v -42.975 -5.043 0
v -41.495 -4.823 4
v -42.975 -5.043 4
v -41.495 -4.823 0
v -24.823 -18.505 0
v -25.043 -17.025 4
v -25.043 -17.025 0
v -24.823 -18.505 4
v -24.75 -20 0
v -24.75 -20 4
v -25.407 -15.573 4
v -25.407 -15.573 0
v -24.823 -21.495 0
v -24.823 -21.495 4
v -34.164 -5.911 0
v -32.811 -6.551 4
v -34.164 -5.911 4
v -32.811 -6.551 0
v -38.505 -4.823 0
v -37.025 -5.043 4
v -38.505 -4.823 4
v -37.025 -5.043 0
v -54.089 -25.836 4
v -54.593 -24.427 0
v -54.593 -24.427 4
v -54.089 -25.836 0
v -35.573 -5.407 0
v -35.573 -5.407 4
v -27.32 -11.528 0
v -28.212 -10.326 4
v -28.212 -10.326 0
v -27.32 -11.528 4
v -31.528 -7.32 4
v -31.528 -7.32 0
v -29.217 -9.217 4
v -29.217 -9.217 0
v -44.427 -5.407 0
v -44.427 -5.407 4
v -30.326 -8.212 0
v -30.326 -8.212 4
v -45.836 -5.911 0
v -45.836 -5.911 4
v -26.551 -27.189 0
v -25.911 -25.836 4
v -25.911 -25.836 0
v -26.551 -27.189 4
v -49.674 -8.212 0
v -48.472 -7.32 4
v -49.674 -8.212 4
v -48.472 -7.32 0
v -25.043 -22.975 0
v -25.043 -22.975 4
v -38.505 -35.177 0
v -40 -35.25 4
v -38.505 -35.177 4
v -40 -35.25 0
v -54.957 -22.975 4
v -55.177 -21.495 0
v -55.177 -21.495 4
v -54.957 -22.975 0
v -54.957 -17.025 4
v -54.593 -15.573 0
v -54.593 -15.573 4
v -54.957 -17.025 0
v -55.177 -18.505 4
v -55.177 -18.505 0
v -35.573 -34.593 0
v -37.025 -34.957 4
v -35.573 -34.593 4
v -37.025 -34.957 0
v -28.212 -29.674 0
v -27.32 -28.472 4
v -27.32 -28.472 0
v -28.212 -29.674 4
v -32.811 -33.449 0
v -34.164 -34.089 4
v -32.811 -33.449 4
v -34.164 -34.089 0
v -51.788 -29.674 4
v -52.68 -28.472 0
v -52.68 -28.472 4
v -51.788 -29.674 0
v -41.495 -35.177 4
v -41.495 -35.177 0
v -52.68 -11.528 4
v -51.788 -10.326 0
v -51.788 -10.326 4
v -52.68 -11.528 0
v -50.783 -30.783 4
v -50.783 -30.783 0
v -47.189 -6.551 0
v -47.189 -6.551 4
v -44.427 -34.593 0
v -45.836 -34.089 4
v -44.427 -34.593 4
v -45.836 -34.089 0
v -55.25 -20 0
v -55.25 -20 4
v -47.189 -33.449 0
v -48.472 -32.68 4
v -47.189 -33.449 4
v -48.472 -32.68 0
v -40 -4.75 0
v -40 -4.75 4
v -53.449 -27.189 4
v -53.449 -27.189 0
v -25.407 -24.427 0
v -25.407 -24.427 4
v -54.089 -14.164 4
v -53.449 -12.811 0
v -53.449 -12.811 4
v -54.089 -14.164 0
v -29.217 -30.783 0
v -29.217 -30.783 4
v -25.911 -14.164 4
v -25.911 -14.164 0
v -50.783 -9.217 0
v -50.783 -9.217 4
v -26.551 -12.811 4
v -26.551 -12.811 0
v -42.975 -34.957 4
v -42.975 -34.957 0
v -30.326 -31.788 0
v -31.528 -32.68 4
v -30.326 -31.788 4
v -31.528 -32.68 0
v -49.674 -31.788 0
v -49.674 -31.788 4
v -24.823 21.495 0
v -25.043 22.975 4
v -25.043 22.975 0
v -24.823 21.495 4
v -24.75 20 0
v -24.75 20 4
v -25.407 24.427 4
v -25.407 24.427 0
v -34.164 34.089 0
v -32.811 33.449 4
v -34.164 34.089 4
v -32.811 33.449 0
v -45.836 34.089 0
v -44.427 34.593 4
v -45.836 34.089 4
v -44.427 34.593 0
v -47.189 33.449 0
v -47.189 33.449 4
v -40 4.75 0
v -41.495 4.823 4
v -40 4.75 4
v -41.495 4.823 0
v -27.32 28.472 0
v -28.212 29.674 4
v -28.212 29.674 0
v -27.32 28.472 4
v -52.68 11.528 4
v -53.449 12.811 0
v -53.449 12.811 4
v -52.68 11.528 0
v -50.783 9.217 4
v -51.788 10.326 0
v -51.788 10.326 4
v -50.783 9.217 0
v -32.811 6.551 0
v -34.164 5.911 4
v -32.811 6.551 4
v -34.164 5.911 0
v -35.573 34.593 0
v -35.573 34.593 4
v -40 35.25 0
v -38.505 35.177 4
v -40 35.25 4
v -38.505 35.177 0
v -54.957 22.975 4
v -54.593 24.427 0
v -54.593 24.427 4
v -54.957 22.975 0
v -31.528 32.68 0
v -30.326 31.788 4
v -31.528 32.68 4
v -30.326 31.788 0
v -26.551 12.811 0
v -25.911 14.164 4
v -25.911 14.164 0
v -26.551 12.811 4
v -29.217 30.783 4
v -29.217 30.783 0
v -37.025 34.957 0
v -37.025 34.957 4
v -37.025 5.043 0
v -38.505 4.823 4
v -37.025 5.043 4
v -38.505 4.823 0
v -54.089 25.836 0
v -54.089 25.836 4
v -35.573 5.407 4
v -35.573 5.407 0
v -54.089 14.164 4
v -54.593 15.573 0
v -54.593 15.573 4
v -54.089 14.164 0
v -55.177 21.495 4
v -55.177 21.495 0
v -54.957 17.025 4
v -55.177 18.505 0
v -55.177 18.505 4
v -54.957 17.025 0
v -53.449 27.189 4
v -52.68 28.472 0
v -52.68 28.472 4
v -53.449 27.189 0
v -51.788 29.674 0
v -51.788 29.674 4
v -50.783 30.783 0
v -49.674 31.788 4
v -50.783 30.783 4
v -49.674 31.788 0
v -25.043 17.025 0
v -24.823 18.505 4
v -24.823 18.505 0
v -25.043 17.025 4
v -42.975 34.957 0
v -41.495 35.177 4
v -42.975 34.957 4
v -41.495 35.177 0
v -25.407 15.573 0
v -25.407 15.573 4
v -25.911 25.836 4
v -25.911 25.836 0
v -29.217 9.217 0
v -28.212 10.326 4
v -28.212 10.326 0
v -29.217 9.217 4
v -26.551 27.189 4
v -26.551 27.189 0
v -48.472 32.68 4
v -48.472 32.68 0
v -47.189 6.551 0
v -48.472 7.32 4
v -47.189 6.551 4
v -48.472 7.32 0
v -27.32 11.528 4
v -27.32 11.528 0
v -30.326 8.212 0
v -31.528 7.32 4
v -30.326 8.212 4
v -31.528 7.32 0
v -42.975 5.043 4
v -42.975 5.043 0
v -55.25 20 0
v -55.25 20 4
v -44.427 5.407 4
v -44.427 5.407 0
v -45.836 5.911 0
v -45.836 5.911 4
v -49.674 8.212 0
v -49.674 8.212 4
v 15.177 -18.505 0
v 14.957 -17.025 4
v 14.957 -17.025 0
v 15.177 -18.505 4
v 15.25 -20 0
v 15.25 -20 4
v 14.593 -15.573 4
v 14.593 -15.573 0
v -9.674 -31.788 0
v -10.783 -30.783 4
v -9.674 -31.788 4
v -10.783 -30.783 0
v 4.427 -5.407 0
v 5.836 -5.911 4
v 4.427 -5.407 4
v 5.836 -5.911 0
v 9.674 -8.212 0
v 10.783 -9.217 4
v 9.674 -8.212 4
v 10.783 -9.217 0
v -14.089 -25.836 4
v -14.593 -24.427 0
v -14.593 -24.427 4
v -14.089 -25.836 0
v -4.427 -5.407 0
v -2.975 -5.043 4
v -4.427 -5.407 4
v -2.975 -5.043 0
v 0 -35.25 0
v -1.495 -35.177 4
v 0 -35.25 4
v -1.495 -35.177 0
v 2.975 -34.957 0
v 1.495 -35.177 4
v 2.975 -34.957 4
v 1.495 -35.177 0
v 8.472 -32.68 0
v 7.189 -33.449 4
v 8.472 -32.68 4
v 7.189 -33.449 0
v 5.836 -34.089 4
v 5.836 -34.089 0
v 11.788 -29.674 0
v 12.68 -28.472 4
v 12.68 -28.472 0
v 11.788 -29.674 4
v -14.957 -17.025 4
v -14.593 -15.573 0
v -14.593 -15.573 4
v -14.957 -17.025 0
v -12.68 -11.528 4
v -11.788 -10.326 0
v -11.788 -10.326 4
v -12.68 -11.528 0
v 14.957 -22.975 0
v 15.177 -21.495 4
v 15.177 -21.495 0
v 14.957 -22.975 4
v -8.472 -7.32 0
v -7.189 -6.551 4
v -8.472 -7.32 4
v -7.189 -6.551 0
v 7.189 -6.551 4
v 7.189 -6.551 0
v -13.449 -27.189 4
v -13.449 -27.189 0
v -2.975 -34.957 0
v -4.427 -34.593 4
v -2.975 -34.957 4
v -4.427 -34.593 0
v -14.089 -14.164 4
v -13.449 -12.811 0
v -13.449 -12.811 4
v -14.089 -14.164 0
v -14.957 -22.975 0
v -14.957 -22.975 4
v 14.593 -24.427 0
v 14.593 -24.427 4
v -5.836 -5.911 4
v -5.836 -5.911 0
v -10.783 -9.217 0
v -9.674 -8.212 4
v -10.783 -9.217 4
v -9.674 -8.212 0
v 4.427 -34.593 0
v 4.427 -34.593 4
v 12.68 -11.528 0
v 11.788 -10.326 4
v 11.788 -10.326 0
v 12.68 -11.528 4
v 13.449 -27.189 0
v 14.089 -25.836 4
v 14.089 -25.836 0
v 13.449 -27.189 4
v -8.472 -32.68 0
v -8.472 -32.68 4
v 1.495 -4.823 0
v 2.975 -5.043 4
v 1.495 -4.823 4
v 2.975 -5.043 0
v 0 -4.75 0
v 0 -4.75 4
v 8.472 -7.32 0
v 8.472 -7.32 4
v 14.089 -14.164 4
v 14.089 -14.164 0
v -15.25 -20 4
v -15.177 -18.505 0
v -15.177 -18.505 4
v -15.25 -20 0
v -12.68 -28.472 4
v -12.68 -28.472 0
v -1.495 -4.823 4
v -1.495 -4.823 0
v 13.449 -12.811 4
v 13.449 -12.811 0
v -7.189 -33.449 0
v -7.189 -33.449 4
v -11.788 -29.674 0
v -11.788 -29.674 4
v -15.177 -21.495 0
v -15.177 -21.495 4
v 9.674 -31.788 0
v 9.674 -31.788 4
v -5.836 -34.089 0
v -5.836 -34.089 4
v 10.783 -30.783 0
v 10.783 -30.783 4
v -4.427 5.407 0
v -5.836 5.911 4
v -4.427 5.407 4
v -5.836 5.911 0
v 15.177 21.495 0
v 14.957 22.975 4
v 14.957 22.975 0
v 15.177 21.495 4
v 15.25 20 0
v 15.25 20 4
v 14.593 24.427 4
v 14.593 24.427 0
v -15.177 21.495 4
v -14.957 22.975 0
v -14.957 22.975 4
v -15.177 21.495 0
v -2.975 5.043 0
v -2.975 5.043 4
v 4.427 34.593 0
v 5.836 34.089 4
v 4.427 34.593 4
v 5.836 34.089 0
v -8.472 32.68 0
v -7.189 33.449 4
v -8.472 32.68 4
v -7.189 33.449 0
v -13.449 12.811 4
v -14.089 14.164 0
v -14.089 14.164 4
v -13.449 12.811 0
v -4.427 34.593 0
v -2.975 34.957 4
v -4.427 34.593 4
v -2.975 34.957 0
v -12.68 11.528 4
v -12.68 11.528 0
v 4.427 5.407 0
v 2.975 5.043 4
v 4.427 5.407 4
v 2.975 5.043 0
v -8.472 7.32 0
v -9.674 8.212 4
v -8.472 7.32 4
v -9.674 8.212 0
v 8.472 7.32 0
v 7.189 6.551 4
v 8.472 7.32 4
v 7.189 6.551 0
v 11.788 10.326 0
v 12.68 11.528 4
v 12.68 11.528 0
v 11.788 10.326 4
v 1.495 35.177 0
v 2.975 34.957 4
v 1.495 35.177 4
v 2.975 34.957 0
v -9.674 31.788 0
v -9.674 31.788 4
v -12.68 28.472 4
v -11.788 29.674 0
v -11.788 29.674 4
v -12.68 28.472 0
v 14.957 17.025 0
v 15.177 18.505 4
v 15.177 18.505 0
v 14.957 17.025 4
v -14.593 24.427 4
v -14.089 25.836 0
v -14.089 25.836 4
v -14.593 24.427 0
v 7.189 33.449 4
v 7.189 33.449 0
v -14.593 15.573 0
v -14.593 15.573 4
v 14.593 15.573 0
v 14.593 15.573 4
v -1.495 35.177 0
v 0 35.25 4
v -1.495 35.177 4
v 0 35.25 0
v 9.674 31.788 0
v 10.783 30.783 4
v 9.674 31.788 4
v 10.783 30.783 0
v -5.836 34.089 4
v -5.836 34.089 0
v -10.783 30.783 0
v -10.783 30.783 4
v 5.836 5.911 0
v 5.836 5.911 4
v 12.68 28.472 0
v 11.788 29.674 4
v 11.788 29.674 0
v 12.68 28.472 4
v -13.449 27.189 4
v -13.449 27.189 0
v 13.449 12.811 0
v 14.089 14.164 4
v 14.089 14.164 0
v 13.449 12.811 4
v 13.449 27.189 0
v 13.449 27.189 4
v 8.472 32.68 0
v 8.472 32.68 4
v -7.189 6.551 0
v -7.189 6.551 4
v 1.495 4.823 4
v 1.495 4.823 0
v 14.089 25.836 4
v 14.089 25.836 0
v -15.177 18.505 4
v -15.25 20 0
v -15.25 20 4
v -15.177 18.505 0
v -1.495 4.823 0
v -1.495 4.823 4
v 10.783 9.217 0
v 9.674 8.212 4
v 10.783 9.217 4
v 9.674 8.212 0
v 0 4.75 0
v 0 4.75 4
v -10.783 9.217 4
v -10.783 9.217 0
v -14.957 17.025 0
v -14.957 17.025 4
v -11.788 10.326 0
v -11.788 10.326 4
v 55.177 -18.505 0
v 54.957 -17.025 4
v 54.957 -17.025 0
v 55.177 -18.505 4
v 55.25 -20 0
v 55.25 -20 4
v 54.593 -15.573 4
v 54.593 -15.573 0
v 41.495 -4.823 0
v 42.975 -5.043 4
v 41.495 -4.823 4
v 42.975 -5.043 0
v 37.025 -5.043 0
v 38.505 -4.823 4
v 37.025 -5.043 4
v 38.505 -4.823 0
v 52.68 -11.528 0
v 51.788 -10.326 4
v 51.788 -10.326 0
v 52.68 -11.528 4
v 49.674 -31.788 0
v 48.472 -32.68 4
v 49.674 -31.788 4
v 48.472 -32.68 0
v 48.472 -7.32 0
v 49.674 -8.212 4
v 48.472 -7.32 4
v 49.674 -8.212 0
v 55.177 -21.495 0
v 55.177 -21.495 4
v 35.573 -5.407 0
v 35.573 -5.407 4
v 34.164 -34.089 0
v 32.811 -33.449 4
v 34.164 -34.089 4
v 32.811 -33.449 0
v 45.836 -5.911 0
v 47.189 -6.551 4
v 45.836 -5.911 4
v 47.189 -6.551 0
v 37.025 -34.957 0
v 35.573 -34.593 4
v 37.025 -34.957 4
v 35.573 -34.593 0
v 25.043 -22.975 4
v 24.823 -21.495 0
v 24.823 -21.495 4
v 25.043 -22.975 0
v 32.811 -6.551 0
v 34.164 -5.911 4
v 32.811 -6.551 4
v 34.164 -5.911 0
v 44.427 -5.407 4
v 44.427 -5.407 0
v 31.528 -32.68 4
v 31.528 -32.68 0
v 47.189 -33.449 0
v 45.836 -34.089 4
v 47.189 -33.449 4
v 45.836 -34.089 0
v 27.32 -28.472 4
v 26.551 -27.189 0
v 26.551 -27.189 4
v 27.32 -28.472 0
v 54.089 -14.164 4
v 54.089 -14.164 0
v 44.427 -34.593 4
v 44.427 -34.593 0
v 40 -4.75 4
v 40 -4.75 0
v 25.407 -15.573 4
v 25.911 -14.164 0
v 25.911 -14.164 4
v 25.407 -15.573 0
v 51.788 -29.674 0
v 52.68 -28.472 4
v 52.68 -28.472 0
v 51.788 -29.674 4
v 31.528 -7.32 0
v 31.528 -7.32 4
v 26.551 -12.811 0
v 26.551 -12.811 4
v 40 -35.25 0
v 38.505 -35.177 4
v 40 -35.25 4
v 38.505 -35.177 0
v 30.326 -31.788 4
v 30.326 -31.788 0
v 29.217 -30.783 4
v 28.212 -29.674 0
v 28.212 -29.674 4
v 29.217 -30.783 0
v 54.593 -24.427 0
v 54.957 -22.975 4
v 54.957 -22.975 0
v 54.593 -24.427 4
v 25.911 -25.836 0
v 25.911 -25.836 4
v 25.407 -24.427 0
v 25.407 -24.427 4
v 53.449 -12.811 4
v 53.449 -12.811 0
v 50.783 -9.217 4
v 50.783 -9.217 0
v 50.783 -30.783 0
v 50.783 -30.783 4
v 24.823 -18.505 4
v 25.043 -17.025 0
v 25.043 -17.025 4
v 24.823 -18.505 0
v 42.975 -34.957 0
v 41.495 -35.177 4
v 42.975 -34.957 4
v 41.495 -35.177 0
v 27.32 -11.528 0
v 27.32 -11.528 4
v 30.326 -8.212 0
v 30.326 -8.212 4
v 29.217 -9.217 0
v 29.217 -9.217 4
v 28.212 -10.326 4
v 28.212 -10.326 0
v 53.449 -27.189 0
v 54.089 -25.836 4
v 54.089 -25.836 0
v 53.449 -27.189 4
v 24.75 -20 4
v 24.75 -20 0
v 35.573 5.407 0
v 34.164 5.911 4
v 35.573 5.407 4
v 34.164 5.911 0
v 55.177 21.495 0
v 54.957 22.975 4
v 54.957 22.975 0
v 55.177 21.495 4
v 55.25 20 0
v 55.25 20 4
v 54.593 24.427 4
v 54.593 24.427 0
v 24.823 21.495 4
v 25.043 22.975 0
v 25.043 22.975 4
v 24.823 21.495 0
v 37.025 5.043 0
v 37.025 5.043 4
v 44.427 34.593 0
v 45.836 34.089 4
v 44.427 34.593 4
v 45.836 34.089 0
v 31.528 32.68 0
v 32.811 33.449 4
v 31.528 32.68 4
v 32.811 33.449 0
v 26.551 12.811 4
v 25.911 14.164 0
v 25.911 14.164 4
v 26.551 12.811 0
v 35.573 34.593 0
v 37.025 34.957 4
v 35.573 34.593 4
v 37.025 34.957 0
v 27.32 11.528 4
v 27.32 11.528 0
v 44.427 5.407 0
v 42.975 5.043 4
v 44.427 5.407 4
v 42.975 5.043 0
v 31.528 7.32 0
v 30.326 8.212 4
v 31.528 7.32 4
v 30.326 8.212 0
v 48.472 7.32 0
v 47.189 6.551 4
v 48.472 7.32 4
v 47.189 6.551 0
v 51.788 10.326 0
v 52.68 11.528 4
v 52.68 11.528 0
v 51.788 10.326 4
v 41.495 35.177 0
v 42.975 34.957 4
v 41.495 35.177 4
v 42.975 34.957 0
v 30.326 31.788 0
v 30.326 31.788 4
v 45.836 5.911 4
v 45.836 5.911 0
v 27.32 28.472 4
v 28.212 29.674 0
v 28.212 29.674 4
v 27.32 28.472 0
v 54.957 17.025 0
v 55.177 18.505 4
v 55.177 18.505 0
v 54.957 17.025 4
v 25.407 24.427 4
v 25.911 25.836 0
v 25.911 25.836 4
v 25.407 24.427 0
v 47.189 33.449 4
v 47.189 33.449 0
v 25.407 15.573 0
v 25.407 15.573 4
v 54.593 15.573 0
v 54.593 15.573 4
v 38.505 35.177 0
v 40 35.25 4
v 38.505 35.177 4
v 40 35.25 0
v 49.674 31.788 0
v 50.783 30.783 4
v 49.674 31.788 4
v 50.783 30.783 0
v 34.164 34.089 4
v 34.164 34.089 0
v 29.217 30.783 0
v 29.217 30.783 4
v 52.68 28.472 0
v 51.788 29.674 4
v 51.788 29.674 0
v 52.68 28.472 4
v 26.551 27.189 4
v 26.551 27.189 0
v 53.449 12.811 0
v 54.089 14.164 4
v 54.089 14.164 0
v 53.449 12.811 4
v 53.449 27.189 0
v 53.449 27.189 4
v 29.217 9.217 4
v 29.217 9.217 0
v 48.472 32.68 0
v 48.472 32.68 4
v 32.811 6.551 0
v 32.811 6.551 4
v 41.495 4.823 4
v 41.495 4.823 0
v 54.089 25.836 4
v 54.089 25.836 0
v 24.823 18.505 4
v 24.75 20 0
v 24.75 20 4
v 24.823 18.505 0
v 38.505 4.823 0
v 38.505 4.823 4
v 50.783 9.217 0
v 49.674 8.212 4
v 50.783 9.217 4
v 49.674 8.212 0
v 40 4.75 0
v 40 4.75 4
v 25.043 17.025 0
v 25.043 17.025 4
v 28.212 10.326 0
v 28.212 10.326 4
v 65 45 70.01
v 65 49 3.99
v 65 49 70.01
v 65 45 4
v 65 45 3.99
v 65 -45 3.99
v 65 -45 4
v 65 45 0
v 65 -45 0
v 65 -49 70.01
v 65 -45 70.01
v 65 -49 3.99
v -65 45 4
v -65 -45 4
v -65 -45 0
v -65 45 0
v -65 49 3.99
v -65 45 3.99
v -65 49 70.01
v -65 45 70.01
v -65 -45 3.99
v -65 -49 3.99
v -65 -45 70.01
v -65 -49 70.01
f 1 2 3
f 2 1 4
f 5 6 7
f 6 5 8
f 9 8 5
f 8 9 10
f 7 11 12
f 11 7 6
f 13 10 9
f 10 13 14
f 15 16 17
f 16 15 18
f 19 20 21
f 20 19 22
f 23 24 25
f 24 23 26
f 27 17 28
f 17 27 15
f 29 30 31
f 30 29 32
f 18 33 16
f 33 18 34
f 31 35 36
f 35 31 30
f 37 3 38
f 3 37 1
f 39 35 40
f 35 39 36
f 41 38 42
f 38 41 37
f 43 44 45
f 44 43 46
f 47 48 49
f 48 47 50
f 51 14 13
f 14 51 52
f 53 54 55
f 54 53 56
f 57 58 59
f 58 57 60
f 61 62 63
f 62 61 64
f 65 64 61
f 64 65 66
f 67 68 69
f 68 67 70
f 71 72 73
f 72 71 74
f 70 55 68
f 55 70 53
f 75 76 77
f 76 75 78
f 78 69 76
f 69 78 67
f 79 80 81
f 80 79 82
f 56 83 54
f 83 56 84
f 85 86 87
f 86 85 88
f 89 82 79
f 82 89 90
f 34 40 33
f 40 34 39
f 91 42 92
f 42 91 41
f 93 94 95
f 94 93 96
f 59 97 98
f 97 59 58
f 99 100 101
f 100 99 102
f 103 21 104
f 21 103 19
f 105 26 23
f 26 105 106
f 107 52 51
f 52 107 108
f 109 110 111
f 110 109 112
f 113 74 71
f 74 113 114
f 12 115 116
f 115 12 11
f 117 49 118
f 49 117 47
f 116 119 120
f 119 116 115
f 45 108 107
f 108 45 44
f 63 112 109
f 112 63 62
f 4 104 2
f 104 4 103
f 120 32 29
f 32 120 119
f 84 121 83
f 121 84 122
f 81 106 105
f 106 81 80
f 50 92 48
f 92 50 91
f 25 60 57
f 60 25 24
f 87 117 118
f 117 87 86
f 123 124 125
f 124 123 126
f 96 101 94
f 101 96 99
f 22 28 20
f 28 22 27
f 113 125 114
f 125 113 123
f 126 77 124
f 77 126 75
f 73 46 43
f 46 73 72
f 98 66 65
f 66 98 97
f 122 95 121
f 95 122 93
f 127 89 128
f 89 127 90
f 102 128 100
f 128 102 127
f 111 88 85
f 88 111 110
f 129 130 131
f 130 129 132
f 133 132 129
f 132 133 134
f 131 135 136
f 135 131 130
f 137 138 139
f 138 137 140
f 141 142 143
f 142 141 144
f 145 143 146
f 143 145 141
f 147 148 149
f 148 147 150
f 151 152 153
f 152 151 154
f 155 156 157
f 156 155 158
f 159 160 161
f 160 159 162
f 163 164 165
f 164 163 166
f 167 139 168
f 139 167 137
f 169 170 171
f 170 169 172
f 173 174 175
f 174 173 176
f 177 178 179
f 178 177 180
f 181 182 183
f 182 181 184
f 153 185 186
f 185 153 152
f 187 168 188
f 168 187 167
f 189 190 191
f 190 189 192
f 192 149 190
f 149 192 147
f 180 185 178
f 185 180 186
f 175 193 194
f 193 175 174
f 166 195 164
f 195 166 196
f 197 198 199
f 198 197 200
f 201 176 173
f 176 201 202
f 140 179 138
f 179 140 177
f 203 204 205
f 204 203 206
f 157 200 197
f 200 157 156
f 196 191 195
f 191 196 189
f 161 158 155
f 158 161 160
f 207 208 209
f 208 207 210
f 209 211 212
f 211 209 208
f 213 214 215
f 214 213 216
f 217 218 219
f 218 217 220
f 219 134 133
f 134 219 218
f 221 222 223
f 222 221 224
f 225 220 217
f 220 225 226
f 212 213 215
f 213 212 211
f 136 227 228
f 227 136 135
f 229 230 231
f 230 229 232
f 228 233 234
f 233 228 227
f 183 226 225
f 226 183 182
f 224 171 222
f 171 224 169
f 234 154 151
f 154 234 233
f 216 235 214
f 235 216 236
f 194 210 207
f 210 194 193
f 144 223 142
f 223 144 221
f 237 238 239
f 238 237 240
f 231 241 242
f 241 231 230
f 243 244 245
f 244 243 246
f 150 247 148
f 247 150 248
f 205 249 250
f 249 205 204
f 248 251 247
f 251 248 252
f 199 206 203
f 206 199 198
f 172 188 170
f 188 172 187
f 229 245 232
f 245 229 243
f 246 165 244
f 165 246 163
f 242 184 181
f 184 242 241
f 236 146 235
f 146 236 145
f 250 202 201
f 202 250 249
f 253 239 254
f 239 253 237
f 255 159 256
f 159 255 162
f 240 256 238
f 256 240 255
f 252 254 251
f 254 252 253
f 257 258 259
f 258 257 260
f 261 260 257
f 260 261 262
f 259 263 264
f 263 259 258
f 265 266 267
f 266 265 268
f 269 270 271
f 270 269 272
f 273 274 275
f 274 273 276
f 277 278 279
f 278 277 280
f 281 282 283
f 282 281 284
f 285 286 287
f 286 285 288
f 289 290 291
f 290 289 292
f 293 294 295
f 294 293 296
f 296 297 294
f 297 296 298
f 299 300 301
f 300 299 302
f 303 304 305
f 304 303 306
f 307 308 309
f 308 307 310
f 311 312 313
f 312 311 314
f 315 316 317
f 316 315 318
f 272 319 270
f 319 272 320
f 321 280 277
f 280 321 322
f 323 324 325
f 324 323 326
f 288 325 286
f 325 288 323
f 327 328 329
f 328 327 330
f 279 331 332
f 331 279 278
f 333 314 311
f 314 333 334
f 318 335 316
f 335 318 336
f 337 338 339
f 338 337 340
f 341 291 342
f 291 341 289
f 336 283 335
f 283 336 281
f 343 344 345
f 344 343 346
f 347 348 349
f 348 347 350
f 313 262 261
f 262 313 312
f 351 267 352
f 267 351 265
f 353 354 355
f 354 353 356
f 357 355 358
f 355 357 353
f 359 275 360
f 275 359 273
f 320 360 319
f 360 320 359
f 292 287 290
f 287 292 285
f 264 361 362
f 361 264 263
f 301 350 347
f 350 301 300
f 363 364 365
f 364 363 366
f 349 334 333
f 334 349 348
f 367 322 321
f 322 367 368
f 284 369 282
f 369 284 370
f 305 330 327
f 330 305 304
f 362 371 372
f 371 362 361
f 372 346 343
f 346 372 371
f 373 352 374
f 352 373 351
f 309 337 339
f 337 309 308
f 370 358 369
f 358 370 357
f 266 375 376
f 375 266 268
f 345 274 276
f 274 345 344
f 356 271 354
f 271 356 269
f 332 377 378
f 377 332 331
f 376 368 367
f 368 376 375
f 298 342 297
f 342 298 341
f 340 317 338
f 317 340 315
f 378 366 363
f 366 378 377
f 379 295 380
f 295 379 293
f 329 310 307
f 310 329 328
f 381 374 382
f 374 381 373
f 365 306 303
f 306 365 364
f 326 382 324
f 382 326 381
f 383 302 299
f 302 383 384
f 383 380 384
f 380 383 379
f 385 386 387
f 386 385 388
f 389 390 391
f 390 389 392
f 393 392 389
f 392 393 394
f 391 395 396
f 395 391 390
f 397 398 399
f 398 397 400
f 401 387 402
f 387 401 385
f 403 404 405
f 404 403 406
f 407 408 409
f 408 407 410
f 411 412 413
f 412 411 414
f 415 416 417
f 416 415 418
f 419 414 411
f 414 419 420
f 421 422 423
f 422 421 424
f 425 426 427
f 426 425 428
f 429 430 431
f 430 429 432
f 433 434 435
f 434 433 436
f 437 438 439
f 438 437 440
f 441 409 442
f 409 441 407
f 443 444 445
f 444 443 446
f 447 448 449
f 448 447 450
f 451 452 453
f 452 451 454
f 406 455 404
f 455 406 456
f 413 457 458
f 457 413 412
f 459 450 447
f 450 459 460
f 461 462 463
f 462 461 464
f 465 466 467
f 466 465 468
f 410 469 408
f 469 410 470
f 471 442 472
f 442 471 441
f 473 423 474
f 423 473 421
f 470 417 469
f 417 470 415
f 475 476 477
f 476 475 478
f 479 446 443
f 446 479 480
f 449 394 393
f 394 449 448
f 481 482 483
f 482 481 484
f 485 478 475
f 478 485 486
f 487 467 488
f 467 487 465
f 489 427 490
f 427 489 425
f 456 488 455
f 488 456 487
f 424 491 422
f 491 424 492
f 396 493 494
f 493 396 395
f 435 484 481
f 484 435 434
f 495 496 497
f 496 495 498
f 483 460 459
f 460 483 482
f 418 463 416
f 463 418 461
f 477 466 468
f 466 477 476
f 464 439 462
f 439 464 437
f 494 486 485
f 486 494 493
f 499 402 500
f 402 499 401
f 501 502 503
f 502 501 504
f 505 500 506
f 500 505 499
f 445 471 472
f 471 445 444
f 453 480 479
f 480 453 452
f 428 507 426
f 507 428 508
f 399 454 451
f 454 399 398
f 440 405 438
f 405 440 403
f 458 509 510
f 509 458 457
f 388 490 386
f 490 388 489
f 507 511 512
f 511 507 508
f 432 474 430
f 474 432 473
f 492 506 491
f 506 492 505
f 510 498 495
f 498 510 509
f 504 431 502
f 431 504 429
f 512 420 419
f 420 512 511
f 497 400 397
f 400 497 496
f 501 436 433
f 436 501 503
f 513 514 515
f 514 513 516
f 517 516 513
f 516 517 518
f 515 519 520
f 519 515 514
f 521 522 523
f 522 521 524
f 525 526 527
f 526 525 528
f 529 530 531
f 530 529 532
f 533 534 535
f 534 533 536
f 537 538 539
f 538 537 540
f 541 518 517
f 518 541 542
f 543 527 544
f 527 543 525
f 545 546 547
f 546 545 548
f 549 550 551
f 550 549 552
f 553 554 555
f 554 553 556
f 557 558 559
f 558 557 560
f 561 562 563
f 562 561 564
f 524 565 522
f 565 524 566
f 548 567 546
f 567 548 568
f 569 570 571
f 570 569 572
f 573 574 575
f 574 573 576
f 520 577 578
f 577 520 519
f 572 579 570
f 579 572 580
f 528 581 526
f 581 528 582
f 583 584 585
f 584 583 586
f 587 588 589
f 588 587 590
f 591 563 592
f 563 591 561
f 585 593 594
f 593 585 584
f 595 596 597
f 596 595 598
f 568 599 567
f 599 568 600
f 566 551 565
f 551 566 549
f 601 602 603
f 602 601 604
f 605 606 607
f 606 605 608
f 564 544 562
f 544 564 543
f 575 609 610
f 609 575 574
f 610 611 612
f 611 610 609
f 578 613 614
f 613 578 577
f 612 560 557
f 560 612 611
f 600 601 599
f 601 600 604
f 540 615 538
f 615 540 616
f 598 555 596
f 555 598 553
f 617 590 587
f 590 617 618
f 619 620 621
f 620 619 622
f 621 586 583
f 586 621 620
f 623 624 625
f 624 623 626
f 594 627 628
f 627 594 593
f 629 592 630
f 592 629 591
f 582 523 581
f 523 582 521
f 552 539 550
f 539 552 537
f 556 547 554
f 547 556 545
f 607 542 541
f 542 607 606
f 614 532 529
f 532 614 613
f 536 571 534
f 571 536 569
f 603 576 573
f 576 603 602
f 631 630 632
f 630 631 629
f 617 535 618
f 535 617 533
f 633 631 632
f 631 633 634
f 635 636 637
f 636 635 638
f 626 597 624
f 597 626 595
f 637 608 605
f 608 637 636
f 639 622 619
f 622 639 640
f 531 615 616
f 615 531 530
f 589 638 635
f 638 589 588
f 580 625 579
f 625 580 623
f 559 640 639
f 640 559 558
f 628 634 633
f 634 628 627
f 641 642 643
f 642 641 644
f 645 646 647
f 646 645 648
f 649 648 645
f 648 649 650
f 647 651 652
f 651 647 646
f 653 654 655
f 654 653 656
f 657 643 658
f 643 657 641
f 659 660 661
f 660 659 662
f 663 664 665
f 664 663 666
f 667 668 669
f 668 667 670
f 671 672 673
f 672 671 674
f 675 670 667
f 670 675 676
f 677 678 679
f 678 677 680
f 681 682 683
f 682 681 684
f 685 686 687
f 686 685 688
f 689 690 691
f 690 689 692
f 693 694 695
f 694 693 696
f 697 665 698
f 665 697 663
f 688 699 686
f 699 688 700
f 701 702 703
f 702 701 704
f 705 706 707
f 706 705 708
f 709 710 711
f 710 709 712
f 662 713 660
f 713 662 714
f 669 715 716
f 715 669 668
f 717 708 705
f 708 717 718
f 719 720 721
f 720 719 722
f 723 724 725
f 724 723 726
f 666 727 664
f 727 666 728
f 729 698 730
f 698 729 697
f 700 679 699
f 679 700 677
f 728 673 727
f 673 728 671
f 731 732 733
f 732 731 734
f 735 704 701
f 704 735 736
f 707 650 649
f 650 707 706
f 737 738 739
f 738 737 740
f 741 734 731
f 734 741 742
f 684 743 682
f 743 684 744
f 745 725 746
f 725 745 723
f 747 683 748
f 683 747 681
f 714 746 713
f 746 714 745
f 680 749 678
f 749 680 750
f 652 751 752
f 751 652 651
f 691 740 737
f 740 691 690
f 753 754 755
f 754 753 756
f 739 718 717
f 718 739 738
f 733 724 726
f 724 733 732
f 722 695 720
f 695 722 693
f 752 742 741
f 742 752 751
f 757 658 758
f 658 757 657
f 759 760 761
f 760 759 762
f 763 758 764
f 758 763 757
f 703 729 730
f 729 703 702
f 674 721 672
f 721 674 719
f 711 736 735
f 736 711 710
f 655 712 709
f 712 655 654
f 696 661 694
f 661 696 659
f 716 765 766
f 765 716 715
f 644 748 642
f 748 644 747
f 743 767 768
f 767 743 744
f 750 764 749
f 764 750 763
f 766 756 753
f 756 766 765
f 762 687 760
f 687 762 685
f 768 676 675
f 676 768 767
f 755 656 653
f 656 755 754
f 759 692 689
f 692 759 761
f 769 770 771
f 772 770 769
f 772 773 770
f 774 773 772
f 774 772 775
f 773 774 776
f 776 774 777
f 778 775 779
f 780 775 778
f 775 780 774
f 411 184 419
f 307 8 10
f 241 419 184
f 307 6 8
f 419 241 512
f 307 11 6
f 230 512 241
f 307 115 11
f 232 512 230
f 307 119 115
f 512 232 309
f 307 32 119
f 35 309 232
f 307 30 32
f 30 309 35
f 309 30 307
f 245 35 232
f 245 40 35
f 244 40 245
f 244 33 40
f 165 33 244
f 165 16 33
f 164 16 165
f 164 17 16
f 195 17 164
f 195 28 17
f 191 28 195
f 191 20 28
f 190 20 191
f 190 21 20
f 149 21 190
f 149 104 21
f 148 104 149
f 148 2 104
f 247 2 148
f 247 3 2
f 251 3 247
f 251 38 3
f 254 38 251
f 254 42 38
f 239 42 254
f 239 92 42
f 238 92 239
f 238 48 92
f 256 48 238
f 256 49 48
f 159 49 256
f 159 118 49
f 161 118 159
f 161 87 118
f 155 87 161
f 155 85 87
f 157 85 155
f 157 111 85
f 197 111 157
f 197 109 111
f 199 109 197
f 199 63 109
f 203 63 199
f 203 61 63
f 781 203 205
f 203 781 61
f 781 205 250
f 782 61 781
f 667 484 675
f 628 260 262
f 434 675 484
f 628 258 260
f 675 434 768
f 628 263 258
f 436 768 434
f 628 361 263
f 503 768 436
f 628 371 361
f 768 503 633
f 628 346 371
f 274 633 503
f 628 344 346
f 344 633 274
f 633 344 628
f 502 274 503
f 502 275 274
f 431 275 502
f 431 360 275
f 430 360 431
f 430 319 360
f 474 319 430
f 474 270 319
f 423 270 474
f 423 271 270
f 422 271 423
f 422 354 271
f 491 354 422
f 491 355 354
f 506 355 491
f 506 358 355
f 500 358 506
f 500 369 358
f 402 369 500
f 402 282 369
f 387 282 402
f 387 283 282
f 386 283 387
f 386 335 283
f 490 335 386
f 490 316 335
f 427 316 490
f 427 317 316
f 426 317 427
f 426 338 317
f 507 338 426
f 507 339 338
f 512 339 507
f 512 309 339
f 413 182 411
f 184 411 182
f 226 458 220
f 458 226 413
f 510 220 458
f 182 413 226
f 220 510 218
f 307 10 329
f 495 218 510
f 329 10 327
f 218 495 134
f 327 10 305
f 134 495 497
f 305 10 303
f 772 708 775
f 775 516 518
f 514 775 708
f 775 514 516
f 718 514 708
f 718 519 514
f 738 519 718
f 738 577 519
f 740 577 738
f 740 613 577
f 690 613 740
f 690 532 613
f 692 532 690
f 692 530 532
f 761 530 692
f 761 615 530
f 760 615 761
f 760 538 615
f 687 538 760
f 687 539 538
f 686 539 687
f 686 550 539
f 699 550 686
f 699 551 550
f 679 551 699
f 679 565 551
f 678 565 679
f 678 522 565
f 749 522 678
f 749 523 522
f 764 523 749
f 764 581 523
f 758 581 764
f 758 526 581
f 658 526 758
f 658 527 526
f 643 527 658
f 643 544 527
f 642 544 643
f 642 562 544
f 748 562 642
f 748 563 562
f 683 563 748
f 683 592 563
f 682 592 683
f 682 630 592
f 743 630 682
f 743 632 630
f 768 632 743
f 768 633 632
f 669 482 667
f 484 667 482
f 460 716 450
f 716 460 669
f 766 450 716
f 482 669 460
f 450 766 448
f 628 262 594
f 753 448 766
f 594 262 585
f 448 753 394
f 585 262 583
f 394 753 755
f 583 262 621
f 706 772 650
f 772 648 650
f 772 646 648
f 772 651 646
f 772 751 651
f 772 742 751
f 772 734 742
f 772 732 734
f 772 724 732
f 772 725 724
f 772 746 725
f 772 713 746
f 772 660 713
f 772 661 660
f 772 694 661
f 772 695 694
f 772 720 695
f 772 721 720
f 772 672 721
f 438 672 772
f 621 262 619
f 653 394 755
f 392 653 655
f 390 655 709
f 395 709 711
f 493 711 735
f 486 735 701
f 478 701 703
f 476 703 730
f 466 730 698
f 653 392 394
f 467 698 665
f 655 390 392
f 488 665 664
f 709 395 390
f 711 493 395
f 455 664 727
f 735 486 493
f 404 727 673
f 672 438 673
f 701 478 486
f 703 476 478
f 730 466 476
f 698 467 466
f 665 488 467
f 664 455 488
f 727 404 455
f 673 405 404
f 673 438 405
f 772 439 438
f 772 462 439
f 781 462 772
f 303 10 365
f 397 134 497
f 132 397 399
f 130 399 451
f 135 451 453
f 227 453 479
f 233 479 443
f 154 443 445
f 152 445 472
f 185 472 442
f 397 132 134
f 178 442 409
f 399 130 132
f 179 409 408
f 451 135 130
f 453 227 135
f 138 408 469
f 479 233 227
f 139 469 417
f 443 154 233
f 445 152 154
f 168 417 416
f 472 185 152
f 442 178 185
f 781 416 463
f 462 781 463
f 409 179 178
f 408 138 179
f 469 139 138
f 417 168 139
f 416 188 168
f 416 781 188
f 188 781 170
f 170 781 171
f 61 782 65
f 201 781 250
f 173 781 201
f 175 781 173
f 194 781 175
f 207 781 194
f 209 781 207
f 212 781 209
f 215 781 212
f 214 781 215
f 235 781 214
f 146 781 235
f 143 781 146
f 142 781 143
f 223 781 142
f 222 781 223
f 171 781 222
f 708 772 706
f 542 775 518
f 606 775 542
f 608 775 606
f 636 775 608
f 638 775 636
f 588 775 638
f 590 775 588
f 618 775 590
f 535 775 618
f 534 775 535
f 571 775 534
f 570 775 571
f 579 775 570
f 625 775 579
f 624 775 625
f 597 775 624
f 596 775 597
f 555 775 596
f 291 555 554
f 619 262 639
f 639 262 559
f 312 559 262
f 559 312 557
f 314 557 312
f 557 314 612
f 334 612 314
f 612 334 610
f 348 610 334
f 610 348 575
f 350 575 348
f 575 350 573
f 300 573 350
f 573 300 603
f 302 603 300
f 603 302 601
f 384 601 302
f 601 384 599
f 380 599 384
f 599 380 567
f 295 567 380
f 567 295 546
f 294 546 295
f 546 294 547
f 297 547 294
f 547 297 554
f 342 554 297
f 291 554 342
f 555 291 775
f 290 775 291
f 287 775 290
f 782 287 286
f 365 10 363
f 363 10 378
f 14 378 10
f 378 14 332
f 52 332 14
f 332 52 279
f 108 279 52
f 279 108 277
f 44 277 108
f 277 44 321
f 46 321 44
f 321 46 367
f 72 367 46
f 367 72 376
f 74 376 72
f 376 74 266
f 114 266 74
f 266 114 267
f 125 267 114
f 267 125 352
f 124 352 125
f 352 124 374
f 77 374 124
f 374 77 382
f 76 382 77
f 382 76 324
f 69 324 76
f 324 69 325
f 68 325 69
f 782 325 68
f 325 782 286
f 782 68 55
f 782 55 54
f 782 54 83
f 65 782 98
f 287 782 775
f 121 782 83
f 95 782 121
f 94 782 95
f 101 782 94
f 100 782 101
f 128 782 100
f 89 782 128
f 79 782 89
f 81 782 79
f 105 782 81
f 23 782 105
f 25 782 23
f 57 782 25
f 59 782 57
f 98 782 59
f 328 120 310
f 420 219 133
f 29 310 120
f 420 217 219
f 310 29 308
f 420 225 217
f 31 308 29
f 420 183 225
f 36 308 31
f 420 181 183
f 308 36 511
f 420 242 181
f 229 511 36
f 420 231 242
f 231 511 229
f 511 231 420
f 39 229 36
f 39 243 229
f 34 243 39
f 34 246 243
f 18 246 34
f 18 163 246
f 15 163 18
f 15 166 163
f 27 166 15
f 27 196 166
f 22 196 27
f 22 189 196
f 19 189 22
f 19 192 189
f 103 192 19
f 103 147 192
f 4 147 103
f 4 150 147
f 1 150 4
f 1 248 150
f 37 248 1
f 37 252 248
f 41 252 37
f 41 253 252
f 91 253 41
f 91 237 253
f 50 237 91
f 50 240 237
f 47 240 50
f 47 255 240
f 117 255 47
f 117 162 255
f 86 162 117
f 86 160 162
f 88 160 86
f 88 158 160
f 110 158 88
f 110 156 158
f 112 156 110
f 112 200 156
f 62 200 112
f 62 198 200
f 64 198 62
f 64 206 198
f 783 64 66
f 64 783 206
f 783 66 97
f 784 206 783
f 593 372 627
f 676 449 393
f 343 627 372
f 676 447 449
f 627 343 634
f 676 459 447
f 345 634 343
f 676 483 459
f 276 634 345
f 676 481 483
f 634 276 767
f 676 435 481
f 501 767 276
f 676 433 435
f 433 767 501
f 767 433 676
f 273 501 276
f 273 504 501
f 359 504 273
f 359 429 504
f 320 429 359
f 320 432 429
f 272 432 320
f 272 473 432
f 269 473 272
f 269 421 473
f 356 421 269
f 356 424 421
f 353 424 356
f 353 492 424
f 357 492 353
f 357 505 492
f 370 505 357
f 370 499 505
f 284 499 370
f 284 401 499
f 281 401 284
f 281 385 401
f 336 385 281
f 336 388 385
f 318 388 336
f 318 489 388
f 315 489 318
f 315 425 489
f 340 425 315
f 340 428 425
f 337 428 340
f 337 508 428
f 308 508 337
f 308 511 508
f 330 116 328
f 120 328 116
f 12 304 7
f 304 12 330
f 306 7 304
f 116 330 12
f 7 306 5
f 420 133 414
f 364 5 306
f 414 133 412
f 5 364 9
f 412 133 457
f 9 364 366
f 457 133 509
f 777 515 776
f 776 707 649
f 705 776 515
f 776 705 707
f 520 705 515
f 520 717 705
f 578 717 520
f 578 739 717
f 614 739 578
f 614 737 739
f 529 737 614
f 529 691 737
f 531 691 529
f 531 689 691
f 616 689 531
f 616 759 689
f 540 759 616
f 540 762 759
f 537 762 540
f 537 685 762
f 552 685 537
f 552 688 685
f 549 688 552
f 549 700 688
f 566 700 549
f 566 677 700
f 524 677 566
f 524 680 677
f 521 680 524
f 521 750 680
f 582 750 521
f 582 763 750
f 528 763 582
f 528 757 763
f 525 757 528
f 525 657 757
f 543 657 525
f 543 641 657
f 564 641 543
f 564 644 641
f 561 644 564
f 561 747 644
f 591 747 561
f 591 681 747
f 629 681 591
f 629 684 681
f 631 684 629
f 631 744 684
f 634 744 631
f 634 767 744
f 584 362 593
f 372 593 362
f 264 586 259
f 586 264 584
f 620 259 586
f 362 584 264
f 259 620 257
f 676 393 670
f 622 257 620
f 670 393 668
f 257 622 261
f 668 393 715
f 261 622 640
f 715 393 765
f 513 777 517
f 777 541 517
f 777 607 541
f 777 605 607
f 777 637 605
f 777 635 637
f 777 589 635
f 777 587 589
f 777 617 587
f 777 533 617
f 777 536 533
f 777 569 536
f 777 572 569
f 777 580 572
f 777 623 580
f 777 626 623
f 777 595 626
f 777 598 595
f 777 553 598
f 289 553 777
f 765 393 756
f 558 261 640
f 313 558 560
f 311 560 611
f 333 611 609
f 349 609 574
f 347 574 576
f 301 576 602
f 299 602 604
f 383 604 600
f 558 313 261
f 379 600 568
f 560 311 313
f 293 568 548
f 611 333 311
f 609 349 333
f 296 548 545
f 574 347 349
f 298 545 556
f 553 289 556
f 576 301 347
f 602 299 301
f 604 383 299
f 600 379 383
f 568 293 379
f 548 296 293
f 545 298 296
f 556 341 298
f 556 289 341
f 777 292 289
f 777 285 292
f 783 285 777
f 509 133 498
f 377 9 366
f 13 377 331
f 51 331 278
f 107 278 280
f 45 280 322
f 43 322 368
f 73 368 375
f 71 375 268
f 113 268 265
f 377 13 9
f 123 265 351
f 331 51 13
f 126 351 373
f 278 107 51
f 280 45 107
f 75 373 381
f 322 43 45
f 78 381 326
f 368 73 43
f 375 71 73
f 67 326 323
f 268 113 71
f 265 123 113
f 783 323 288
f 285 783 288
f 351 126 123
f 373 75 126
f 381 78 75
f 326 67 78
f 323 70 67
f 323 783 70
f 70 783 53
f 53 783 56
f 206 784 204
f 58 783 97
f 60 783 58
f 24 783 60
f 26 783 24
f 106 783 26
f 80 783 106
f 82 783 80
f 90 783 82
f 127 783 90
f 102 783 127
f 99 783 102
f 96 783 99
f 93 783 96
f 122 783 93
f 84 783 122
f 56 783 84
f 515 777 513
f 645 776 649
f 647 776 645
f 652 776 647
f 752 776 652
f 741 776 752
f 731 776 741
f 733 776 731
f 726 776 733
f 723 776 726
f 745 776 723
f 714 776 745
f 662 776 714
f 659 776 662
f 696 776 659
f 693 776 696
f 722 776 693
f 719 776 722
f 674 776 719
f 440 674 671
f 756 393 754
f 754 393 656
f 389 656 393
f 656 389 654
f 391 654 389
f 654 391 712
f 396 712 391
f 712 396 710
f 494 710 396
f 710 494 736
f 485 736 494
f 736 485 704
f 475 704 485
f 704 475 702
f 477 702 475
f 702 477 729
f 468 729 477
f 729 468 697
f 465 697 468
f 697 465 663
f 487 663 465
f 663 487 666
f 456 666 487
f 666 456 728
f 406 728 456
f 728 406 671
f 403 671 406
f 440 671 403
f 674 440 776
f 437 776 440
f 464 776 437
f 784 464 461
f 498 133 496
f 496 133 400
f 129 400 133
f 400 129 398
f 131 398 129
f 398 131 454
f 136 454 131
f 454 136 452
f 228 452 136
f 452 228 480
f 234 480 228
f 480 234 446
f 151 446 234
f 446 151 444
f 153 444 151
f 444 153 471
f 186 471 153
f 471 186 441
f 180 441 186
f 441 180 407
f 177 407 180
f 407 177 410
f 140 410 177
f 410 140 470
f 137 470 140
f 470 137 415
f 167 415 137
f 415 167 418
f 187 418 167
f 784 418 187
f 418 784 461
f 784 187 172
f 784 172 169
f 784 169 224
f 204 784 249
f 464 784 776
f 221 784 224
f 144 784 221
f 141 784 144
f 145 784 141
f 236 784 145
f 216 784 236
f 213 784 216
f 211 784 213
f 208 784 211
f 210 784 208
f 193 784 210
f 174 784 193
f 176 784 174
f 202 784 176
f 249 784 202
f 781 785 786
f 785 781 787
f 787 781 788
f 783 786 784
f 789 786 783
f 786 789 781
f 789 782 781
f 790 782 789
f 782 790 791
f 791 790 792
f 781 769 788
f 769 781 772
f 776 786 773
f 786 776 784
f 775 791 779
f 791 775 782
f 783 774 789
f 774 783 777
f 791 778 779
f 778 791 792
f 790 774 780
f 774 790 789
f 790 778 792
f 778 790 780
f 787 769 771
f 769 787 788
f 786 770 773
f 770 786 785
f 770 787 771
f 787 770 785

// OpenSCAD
// Rack for six 50 mL Falcon tubes
// Print orientation: upside down, flipped after printing
// Units: mm

$fn = 64; // smoothness for cylinders

// Plate dimensions
plate_X = 130;
plate_Y = 90;
plate_Z = 4;

// Hole parameters
hole_d = 30.5;
hole_h = plate_Z + 0.02; // extend 0.01 mm beyond each face
hole_z = plate_Z / 2;   // center at middle of plate

// Hole grid: 3 columns (X) and 2 rows (Y)
// centre‑to‑centre spacing 40 mm
hole_X_offsets = [-40, 0, 40];
hole_Y_offsets = [-20, 20];

// Wall parameters
wall_X = plate_X;          // 130 mm long in X
wall_Y = 4;                // 4 mm thick in Y
wall_Z = 70 - plate_Z;     // 66 mm tall
wall_Z_ext = wall_Z + 0.02; // extend 0.01 mm beyond top and bottom
wall_z = plate_Z - 0.01;   // bottom starts 0.01 mm below plate top

// Plate origin: centred on X and Y, bottom at z = 0
plate_origin = [ -plate_X/2, -plate_Y/2, 0 ];

// Wall origins: left wall at Y = -plate_Y/2 - wall_Y,
// right wall at Y = plate_Y/2
left_wall_origin  = [ -plate_X/2, -plate_Y/2 - wall_Y, wall_z ];
right_wall_origin = [ -plate_X/2,  plate_Y/2,          wall_z ];

// Build plate with holes
module plate_with_holes() {
    difference() {
        // Plate
        translate(plate_origin) cube([plate_X, plate_Y, plate_Z]);

        // Holes
        for (x = hole_X_offsets) {
            for (y = hole_Y_offsets) {
                translate([x, y, hole_z]) cylinder(d=hole_d, h=hole_h, center=true);
            }
        }
    }
}

// Build walls
module walls() {
    union() {
        // Left wall
        translate(left_wall_origin) cube([wall_X, wall_Y, wall_Z_ext]);

        // Right wall
        translate(right_wall_origin) cube([wall_X, wall_Y, wall_Z_ext]);
    }
}

// Final rack
union() {
    plate_with_holes();
    walls();
}
